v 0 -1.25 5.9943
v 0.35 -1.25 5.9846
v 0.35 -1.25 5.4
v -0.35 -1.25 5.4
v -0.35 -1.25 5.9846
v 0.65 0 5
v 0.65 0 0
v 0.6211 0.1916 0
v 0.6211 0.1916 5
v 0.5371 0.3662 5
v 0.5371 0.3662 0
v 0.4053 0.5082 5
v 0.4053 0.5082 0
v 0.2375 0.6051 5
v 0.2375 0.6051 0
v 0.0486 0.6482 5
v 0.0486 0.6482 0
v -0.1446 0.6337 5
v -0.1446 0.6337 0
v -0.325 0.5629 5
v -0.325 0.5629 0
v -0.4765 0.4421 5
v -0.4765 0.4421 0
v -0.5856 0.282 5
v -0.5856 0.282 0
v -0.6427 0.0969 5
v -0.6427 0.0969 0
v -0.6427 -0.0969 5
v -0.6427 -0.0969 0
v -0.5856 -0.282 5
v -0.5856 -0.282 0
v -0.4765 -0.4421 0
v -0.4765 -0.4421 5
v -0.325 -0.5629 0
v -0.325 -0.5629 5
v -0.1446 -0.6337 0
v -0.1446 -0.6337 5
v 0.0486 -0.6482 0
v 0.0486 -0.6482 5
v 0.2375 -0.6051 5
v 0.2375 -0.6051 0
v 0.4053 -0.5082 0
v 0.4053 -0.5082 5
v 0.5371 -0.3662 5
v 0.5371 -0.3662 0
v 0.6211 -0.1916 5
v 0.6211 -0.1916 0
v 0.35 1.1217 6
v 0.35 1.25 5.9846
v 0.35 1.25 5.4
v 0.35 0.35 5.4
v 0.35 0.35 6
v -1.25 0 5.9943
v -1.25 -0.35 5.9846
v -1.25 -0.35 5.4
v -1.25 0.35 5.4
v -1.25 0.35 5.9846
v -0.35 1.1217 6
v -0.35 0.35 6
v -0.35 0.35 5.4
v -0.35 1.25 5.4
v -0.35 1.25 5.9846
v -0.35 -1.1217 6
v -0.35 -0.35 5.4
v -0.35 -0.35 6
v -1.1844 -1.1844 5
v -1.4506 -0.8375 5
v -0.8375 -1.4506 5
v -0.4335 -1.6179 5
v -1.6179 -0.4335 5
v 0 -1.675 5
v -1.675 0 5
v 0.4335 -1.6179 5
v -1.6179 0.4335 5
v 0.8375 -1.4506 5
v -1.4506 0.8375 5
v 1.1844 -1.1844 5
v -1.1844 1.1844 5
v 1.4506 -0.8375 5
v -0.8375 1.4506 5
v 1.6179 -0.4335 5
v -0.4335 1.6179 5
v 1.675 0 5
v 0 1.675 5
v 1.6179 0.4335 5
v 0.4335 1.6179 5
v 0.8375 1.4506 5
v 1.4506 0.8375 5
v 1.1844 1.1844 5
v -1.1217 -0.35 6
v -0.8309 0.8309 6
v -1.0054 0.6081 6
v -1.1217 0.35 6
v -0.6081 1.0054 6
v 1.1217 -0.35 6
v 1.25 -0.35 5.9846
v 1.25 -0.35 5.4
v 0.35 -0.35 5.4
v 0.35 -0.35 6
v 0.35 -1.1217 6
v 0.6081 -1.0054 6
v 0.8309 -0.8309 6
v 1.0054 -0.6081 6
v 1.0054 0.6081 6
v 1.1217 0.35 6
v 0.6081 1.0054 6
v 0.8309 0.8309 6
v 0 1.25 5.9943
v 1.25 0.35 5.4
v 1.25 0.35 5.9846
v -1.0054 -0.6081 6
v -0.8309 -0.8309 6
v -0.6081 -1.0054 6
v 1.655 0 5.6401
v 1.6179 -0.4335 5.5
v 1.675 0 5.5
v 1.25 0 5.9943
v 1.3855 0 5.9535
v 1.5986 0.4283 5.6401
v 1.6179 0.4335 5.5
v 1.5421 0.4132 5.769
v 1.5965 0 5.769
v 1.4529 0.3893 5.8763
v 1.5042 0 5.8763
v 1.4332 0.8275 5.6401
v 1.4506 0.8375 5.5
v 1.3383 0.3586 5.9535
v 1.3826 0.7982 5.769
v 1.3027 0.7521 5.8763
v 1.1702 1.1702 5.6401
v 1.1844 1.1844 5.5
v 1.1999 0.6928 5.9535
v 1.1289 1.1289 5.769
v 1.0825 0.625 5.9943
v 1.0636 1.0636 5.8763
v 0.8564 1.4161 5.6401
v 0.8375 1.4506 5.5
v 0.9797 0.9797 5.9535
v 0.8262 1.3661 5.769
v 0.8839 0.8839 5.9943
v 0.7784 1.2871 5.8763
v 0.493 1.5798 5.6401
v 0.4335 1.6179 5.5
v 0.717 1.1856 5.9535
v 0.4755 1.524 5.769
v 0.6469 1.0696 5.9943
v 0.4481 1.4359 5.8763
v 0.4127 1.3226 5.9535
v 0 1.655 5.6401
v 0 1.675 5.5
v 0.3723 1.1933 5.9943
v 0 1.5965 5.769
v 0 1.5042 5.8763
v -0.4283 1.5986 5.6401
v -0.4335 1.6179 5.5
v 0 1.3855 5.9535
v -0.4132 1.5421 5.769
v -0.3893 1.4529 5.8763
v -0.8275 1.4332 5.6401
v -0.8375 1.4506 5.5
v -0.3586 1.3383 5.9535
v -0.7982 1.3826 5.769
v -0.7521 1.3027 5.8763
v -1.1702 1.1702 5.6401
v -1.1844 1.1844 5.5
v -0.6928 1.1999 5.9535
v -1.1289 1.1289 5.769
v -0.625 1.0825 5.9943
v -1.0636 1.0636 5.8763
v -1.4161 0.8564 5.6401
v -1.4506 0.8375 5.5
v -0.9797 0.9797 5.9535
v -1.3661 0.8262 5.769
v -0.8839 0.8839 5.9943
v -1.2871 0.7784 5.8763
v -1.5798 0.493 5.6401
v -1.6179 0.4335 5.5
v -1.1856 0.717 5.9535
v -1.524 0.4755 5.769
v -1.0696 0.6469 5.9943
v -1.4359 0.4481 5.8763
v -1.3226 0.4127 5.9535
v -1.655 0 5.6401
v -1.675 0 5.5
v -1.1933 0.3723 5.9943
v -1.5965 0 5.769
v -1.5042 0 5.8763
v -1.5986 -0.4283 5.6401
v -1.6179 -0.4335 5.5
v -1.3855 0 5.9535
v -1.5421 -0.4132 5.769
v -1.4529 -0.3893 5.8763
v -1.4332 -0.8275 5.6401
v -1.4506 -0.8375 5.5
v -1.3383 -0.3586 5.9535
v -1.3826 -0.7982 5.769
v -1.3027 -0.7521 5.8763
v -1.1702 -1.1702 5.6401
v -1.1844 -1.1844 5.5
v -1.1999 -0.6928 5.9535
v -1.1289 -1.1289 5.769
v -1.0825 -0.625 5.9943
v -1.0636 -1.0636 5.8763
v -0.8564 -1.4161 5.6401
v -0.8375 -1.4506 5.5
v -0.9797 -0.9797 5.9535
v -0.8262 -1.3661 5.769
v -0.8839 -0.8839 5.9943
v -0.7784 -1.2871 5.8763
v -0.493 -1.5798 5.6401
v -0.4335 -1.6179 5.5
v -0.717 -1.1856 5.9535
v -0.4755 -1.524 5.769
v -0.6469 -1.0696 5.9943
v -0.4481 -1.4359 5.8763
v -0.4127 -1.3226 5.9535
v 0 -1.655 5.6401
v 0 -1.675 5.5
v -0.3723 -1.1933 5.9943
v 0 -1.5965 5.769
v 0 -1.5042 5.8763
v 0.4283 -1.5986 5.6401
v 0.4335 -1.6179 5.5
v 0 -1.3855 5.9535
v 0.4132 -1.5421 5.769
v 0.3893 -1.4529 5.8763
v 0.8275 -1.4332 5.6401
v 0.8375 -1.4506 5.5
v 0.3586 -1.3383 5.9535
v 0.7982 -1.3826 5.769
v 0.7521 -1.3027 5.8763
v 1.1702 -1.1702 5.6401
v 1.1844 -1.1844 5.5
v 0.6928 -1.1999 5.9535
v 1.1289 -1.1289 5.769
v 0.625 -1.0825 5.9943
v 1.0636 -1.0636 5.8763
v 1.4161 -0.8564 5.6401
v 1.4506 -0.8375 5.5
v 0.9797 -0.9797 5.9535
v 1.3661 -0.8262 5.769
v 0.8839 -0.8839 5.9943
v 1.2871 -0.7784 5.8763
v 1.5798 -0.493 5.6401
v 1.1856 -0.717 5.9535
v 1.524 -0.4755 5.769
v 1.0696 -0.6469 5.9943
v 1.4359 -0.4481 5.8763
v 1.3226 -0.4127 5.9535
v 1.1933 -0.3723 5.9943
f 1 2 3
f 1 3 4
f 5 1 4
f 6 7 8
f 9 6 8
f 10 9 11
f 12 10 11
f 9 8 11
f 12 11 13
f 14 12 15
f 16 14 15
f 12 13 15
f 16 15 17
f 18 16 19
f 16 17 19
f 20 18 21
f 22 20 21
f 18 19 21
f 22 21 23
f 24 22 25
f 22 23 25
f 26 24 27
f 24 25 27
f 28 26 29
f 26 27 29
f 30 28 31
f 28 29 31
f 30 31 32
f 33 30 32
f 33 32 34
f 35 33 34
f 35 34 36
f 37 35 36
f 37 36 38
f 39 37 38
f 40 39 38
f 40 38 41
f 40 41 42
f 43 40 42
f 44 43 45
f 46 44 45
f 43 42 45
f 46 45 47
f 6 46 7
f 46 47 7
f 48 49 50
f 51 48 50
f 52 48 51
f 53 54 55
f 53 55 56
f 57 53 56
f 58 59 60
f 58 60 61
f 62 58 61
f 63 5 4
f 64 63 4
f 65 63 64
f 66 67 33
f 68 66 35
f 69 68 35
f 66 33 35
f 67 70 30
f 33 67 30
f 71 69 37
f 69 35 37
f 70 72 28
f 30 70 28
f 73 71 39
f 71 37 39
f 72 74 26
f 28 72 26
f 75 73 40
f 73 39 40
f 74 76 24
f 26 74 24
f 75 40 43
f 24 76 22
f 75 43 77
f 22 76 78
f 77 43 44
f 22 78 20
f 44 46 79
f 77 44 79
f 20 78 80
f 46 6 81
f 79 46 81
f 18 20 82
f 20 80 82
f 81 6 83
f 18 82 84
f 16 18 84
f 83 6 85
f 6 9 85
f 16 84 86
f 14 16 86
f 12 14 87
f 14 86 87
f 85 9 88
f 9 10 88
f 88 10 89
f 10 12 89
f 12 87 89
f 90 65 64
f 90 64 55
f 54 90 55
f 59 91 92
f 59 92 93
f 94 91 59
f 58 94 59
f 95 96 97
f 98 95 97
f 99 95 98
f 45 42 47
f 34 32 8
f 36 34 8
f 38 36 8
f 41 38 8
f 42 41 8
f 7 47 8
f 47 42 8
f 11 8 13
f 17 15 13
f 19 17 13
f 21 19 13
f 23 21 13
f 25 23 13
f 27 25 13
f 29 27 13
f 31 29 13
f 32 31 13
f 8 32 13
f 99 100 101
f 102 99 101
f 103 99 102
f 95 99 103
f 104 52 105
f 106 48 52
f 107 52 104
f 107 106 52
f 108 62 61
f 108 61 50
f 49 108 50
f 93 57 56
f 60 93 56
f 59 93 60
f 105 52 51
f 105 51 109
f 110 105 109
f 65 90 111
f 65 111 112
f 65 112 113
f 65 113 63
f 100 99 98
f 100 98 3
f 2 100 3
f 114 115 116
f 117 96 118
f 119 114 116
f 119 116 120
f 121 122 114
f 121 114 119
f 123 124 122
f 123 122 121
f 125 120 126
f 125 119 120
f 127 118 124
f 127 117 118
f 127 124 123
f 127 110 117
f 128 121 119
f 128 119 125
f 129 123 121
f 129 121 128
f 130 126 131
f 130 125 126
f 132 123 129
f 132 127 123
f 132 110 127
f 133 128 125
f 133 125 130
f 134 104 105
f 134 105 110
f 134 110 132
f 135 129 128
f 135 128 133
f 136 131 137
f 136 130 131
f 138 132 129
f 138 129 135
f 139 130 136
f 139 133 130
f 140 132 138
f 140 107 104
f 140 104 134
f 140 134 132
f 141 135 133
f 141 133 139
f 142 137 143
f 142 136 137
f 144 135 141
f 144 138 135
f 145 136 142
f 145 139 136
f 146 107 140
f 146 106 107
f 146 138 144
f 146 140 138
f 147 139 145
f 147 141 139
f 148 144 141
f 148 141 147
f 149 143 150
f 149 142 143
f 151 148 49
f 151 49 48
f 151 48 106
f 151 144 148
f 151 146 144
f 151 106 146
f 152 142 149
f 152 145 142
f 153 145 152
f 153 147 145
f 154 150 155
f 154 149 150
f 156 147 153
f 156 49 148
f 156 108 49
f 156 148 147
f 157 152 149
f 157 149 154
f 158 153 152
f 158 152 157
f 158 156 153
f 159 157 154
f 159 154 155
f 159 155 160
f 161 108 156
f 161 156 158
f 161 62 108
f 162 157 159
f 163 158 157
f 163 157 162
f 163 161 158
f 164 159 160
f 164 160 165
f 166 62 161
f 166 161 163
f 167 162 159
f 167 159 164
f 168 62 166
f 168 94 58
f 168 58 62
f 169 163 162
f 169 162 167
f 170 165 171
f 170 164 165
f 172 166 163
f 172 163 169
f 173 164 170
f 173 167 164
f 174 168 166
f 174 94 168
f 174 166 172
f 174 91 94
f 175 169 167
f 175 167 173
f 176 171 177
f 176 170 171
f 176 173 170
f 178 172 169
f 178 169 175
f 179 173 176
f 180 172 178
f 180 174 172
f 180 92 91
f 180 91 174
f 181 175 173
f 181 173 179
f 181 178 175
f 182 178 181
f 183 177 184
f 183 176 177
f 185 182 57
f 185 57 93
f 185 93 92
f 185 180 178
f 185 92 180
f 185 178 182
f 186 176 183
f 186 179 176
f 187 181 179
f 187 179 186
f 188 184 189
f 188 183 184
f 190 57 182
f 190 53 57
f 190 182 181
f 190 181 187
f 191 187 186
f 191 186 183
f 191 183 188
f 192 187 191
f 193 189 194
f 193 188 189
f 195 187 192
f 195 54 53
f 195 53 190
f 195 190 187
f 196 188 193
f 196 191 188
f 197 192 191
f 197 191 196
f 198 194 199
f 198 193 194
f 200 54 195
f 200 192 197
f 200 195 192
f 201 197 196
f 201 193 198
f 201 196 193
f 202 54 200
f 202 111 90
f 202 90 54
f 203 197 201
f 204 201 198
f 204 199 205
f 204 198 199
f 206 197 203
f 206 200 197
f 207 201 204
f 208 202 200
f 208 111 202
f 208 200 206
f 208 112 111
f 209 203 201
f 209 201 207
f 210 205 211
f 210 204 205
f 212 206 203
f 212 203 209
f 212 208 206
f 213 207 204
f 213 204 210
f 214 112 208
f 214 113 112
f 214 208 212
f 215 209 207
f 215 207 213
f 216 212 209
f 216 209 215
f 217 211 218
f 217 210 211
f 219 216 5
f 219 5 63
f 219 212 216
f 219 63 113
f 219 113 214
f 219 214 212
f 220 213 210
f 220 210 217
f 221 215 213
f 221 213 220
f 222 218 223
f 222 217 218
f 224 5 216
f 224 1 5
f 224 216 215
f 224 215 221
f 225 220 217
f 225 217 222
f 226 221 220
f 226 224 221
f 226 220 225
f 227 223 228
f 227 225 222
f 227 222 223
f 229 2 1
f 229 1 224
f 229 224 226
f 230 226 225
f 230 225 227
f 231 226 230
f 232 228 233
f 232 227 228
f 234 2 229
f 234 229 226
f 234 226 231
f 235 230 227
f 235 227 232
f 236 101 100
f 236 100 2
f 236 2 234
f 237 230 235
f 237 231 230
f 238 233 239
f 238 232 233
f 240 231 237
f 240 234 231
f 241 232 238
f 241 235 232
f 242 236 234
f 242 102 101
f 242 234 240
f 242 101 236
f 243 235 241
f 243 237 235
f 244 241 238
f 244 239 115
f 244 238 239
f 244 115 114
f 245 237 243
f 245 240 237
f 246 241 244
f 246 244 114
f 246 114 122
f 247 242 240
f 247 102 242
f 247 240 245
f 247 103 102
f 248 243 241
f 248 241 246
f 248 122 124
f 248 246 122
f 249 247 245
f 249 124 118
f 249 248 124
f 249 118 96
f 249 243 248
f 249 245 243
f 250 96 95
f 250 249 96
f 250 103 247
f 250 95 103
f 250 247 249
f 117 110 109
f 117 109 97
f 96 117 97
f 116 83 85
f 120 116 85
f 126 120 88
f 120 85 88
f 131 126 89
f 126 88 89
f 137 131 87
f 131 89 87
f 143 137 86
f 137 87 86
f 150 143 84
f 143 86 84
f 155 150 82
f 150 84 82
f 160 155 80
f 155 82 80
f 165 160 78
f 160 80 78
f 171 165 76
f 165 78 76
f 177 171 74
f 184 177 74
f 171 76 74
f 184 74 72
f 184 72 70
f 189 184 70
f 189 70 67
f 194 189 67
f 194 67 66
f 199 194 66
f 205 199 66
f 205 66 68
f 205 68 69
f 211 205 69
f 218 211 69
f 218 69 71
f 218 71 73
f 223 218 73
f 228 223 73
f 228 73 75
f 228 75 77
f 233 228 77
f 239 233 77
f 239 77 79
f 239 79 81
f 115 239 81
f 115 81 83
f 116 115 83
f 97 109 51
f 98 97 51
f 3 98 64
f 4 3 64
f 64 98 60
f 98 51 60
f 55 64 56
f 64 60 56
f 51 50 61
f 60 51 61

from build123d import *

# Parameters (mm, degrees)
CROQUIS1_R              = 0.65
SALIENTE_EXTRUIR1_DEPTH = 5
CROQUIS2_R              = 1.675
SALIENTE_EXTRUIR2_DEPTH = 1
CORTAR_EXTRUIR1_DEPTH   = 0.6
REDONDEO1_R             = 0.5


with BuildPart() as part:
    # Croquis1 → Saliente-Extruir1 (new body)
    with BuildSketch(Plane.XY):
        Circle(CROQUIS1_R)
    extrude(amount=SALIENTE_EXTRUIR1_DEPTH)

    # Croquis2 → Saliente-Extruir2 (add)
    with BuildSketch(Plane.XY.offset(5)):
        Circle(CROQUIS2_R)
    extrude(amount=SALIENTE_EXTRUIR2_DEPTH)

    # Croquis3 → Cortar-Extruir1 (cut)
    with BuildSketch(Plane.XY.offset(6)):
        Polygon((0.35, 0.35), (1.25, 0.35), (1.25, -0.35), (0.35, -0.35), (0.35, -1.25), (-0.35, -1.25), (-0.35, -0.35), (-1.25, -0.35), (-1.25, 0.35), (-0.35, 0.35), (-0.35, 1.25), (0.35, 1.25), align=None)
    extrude(amount=-CORTAR_EXTRUIR1_DEPTH, mode=Mode.SUBTRACT)

    # Redondeo1
    # the kernel refuses this fillet: 0.5 mm, written as the material it takes off along each edge
    with BuildSketch(Plane(origin=(0, 0, 6), x_dir=(1, 0, 0), z_dir=(0, -1, 0))) as redondeo1_piece_1:
        with BuildLine():
            CenterArc((1.675 - REDONDEO1_R, -REDONDEO1_R), REDONDEO1_R, 0, 90)
            Line((1.675 - REDONDEO1_R, 0), (1.675, 0))
            Line((1.675, 0), (1.675, -REDONDEO1_R))
        make_face()
    revolve(axis=Axis((0, 0, 6), (0, 0, 1)), mode=Mode.SUBTRACT)


solid = part.part
